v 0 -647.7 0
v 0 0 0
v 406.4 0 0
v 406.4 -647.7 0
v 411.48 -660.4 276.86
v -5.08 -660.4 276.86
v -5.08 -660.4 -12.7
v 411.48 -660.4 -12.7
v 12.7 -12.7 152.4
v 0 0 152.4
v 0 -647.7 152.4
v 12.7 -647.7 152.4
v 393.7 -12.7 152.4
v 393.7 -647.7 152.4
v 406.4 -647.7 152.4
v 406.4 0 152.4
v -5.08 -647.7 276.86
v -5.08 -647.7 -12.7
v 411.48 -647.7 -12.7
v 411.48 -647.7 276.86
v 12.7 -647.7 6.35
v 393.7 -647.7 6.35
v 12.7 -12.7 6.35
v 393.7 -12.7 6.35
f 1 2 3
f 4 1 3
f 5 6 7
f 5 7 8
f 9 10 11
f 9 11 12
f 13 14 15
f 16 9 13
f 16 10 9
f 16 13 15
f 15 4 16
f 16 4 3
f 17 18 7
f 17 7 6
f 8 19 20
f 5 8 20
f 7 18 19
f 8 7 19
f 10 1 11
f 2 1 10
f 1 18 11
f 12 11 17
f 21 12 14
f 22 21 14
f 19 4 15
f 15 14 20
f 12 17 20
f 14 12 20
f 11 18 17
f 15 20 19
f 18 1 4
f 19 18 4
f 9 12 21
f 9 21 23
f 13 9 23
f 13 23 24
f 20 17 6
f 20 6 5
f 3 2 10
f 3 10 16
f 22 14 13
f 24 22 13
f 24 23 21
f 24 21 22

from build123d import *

# Parameters (mm, degrees)
F0_W     = 406.4
F0_H     = 647.7
F1_DEPTH = 152.4
F2_W     = 416.56
F2_H     = 289.56
F2_W_2   = 406.4
F2_H_2   = 152.4
F3_DEPTH = 12.7
F4_W     = 381
F4_H     = 635
F5_DEPTH = 146.05


with BuildPart() as f1:
    # F0 (on Top) → F1 (new body)
    with BuildSketch(Plane.XY):
        with Locations((203.2, -323.85)):
            Rectangle(F0_W, F0_H)
    extrude(amount=F1_DEPTH)

    # F2 (on face) → F3 (join)
    with BuildSketch(Plane.XZ.offset(647.7)):
        with Locations((203.2, 132.08)):
            Rectangle(F2_W, F2_H)
        with Locations((203.2, 76.2)):
            Rectangle(F2_W_2, F2_H_2, mode=Mode.SUBTRACT)
        with Locations((203.2, 76.2)):
            Rectangle(F2_W_2, F2_H_2)
    extrude(amount=F3_DEPTH)

    # F4 (on face) → F5 (cut)
    with BuildSketch(Plane.XY.offset(152.4)):
        with Locations((203.2, -330.2)):
            Rectangle(F4_W, F4_H)
    extrude(amount=-F5_DEPTH, mode=Mode.SUBTRACT)


solid = f1.part
